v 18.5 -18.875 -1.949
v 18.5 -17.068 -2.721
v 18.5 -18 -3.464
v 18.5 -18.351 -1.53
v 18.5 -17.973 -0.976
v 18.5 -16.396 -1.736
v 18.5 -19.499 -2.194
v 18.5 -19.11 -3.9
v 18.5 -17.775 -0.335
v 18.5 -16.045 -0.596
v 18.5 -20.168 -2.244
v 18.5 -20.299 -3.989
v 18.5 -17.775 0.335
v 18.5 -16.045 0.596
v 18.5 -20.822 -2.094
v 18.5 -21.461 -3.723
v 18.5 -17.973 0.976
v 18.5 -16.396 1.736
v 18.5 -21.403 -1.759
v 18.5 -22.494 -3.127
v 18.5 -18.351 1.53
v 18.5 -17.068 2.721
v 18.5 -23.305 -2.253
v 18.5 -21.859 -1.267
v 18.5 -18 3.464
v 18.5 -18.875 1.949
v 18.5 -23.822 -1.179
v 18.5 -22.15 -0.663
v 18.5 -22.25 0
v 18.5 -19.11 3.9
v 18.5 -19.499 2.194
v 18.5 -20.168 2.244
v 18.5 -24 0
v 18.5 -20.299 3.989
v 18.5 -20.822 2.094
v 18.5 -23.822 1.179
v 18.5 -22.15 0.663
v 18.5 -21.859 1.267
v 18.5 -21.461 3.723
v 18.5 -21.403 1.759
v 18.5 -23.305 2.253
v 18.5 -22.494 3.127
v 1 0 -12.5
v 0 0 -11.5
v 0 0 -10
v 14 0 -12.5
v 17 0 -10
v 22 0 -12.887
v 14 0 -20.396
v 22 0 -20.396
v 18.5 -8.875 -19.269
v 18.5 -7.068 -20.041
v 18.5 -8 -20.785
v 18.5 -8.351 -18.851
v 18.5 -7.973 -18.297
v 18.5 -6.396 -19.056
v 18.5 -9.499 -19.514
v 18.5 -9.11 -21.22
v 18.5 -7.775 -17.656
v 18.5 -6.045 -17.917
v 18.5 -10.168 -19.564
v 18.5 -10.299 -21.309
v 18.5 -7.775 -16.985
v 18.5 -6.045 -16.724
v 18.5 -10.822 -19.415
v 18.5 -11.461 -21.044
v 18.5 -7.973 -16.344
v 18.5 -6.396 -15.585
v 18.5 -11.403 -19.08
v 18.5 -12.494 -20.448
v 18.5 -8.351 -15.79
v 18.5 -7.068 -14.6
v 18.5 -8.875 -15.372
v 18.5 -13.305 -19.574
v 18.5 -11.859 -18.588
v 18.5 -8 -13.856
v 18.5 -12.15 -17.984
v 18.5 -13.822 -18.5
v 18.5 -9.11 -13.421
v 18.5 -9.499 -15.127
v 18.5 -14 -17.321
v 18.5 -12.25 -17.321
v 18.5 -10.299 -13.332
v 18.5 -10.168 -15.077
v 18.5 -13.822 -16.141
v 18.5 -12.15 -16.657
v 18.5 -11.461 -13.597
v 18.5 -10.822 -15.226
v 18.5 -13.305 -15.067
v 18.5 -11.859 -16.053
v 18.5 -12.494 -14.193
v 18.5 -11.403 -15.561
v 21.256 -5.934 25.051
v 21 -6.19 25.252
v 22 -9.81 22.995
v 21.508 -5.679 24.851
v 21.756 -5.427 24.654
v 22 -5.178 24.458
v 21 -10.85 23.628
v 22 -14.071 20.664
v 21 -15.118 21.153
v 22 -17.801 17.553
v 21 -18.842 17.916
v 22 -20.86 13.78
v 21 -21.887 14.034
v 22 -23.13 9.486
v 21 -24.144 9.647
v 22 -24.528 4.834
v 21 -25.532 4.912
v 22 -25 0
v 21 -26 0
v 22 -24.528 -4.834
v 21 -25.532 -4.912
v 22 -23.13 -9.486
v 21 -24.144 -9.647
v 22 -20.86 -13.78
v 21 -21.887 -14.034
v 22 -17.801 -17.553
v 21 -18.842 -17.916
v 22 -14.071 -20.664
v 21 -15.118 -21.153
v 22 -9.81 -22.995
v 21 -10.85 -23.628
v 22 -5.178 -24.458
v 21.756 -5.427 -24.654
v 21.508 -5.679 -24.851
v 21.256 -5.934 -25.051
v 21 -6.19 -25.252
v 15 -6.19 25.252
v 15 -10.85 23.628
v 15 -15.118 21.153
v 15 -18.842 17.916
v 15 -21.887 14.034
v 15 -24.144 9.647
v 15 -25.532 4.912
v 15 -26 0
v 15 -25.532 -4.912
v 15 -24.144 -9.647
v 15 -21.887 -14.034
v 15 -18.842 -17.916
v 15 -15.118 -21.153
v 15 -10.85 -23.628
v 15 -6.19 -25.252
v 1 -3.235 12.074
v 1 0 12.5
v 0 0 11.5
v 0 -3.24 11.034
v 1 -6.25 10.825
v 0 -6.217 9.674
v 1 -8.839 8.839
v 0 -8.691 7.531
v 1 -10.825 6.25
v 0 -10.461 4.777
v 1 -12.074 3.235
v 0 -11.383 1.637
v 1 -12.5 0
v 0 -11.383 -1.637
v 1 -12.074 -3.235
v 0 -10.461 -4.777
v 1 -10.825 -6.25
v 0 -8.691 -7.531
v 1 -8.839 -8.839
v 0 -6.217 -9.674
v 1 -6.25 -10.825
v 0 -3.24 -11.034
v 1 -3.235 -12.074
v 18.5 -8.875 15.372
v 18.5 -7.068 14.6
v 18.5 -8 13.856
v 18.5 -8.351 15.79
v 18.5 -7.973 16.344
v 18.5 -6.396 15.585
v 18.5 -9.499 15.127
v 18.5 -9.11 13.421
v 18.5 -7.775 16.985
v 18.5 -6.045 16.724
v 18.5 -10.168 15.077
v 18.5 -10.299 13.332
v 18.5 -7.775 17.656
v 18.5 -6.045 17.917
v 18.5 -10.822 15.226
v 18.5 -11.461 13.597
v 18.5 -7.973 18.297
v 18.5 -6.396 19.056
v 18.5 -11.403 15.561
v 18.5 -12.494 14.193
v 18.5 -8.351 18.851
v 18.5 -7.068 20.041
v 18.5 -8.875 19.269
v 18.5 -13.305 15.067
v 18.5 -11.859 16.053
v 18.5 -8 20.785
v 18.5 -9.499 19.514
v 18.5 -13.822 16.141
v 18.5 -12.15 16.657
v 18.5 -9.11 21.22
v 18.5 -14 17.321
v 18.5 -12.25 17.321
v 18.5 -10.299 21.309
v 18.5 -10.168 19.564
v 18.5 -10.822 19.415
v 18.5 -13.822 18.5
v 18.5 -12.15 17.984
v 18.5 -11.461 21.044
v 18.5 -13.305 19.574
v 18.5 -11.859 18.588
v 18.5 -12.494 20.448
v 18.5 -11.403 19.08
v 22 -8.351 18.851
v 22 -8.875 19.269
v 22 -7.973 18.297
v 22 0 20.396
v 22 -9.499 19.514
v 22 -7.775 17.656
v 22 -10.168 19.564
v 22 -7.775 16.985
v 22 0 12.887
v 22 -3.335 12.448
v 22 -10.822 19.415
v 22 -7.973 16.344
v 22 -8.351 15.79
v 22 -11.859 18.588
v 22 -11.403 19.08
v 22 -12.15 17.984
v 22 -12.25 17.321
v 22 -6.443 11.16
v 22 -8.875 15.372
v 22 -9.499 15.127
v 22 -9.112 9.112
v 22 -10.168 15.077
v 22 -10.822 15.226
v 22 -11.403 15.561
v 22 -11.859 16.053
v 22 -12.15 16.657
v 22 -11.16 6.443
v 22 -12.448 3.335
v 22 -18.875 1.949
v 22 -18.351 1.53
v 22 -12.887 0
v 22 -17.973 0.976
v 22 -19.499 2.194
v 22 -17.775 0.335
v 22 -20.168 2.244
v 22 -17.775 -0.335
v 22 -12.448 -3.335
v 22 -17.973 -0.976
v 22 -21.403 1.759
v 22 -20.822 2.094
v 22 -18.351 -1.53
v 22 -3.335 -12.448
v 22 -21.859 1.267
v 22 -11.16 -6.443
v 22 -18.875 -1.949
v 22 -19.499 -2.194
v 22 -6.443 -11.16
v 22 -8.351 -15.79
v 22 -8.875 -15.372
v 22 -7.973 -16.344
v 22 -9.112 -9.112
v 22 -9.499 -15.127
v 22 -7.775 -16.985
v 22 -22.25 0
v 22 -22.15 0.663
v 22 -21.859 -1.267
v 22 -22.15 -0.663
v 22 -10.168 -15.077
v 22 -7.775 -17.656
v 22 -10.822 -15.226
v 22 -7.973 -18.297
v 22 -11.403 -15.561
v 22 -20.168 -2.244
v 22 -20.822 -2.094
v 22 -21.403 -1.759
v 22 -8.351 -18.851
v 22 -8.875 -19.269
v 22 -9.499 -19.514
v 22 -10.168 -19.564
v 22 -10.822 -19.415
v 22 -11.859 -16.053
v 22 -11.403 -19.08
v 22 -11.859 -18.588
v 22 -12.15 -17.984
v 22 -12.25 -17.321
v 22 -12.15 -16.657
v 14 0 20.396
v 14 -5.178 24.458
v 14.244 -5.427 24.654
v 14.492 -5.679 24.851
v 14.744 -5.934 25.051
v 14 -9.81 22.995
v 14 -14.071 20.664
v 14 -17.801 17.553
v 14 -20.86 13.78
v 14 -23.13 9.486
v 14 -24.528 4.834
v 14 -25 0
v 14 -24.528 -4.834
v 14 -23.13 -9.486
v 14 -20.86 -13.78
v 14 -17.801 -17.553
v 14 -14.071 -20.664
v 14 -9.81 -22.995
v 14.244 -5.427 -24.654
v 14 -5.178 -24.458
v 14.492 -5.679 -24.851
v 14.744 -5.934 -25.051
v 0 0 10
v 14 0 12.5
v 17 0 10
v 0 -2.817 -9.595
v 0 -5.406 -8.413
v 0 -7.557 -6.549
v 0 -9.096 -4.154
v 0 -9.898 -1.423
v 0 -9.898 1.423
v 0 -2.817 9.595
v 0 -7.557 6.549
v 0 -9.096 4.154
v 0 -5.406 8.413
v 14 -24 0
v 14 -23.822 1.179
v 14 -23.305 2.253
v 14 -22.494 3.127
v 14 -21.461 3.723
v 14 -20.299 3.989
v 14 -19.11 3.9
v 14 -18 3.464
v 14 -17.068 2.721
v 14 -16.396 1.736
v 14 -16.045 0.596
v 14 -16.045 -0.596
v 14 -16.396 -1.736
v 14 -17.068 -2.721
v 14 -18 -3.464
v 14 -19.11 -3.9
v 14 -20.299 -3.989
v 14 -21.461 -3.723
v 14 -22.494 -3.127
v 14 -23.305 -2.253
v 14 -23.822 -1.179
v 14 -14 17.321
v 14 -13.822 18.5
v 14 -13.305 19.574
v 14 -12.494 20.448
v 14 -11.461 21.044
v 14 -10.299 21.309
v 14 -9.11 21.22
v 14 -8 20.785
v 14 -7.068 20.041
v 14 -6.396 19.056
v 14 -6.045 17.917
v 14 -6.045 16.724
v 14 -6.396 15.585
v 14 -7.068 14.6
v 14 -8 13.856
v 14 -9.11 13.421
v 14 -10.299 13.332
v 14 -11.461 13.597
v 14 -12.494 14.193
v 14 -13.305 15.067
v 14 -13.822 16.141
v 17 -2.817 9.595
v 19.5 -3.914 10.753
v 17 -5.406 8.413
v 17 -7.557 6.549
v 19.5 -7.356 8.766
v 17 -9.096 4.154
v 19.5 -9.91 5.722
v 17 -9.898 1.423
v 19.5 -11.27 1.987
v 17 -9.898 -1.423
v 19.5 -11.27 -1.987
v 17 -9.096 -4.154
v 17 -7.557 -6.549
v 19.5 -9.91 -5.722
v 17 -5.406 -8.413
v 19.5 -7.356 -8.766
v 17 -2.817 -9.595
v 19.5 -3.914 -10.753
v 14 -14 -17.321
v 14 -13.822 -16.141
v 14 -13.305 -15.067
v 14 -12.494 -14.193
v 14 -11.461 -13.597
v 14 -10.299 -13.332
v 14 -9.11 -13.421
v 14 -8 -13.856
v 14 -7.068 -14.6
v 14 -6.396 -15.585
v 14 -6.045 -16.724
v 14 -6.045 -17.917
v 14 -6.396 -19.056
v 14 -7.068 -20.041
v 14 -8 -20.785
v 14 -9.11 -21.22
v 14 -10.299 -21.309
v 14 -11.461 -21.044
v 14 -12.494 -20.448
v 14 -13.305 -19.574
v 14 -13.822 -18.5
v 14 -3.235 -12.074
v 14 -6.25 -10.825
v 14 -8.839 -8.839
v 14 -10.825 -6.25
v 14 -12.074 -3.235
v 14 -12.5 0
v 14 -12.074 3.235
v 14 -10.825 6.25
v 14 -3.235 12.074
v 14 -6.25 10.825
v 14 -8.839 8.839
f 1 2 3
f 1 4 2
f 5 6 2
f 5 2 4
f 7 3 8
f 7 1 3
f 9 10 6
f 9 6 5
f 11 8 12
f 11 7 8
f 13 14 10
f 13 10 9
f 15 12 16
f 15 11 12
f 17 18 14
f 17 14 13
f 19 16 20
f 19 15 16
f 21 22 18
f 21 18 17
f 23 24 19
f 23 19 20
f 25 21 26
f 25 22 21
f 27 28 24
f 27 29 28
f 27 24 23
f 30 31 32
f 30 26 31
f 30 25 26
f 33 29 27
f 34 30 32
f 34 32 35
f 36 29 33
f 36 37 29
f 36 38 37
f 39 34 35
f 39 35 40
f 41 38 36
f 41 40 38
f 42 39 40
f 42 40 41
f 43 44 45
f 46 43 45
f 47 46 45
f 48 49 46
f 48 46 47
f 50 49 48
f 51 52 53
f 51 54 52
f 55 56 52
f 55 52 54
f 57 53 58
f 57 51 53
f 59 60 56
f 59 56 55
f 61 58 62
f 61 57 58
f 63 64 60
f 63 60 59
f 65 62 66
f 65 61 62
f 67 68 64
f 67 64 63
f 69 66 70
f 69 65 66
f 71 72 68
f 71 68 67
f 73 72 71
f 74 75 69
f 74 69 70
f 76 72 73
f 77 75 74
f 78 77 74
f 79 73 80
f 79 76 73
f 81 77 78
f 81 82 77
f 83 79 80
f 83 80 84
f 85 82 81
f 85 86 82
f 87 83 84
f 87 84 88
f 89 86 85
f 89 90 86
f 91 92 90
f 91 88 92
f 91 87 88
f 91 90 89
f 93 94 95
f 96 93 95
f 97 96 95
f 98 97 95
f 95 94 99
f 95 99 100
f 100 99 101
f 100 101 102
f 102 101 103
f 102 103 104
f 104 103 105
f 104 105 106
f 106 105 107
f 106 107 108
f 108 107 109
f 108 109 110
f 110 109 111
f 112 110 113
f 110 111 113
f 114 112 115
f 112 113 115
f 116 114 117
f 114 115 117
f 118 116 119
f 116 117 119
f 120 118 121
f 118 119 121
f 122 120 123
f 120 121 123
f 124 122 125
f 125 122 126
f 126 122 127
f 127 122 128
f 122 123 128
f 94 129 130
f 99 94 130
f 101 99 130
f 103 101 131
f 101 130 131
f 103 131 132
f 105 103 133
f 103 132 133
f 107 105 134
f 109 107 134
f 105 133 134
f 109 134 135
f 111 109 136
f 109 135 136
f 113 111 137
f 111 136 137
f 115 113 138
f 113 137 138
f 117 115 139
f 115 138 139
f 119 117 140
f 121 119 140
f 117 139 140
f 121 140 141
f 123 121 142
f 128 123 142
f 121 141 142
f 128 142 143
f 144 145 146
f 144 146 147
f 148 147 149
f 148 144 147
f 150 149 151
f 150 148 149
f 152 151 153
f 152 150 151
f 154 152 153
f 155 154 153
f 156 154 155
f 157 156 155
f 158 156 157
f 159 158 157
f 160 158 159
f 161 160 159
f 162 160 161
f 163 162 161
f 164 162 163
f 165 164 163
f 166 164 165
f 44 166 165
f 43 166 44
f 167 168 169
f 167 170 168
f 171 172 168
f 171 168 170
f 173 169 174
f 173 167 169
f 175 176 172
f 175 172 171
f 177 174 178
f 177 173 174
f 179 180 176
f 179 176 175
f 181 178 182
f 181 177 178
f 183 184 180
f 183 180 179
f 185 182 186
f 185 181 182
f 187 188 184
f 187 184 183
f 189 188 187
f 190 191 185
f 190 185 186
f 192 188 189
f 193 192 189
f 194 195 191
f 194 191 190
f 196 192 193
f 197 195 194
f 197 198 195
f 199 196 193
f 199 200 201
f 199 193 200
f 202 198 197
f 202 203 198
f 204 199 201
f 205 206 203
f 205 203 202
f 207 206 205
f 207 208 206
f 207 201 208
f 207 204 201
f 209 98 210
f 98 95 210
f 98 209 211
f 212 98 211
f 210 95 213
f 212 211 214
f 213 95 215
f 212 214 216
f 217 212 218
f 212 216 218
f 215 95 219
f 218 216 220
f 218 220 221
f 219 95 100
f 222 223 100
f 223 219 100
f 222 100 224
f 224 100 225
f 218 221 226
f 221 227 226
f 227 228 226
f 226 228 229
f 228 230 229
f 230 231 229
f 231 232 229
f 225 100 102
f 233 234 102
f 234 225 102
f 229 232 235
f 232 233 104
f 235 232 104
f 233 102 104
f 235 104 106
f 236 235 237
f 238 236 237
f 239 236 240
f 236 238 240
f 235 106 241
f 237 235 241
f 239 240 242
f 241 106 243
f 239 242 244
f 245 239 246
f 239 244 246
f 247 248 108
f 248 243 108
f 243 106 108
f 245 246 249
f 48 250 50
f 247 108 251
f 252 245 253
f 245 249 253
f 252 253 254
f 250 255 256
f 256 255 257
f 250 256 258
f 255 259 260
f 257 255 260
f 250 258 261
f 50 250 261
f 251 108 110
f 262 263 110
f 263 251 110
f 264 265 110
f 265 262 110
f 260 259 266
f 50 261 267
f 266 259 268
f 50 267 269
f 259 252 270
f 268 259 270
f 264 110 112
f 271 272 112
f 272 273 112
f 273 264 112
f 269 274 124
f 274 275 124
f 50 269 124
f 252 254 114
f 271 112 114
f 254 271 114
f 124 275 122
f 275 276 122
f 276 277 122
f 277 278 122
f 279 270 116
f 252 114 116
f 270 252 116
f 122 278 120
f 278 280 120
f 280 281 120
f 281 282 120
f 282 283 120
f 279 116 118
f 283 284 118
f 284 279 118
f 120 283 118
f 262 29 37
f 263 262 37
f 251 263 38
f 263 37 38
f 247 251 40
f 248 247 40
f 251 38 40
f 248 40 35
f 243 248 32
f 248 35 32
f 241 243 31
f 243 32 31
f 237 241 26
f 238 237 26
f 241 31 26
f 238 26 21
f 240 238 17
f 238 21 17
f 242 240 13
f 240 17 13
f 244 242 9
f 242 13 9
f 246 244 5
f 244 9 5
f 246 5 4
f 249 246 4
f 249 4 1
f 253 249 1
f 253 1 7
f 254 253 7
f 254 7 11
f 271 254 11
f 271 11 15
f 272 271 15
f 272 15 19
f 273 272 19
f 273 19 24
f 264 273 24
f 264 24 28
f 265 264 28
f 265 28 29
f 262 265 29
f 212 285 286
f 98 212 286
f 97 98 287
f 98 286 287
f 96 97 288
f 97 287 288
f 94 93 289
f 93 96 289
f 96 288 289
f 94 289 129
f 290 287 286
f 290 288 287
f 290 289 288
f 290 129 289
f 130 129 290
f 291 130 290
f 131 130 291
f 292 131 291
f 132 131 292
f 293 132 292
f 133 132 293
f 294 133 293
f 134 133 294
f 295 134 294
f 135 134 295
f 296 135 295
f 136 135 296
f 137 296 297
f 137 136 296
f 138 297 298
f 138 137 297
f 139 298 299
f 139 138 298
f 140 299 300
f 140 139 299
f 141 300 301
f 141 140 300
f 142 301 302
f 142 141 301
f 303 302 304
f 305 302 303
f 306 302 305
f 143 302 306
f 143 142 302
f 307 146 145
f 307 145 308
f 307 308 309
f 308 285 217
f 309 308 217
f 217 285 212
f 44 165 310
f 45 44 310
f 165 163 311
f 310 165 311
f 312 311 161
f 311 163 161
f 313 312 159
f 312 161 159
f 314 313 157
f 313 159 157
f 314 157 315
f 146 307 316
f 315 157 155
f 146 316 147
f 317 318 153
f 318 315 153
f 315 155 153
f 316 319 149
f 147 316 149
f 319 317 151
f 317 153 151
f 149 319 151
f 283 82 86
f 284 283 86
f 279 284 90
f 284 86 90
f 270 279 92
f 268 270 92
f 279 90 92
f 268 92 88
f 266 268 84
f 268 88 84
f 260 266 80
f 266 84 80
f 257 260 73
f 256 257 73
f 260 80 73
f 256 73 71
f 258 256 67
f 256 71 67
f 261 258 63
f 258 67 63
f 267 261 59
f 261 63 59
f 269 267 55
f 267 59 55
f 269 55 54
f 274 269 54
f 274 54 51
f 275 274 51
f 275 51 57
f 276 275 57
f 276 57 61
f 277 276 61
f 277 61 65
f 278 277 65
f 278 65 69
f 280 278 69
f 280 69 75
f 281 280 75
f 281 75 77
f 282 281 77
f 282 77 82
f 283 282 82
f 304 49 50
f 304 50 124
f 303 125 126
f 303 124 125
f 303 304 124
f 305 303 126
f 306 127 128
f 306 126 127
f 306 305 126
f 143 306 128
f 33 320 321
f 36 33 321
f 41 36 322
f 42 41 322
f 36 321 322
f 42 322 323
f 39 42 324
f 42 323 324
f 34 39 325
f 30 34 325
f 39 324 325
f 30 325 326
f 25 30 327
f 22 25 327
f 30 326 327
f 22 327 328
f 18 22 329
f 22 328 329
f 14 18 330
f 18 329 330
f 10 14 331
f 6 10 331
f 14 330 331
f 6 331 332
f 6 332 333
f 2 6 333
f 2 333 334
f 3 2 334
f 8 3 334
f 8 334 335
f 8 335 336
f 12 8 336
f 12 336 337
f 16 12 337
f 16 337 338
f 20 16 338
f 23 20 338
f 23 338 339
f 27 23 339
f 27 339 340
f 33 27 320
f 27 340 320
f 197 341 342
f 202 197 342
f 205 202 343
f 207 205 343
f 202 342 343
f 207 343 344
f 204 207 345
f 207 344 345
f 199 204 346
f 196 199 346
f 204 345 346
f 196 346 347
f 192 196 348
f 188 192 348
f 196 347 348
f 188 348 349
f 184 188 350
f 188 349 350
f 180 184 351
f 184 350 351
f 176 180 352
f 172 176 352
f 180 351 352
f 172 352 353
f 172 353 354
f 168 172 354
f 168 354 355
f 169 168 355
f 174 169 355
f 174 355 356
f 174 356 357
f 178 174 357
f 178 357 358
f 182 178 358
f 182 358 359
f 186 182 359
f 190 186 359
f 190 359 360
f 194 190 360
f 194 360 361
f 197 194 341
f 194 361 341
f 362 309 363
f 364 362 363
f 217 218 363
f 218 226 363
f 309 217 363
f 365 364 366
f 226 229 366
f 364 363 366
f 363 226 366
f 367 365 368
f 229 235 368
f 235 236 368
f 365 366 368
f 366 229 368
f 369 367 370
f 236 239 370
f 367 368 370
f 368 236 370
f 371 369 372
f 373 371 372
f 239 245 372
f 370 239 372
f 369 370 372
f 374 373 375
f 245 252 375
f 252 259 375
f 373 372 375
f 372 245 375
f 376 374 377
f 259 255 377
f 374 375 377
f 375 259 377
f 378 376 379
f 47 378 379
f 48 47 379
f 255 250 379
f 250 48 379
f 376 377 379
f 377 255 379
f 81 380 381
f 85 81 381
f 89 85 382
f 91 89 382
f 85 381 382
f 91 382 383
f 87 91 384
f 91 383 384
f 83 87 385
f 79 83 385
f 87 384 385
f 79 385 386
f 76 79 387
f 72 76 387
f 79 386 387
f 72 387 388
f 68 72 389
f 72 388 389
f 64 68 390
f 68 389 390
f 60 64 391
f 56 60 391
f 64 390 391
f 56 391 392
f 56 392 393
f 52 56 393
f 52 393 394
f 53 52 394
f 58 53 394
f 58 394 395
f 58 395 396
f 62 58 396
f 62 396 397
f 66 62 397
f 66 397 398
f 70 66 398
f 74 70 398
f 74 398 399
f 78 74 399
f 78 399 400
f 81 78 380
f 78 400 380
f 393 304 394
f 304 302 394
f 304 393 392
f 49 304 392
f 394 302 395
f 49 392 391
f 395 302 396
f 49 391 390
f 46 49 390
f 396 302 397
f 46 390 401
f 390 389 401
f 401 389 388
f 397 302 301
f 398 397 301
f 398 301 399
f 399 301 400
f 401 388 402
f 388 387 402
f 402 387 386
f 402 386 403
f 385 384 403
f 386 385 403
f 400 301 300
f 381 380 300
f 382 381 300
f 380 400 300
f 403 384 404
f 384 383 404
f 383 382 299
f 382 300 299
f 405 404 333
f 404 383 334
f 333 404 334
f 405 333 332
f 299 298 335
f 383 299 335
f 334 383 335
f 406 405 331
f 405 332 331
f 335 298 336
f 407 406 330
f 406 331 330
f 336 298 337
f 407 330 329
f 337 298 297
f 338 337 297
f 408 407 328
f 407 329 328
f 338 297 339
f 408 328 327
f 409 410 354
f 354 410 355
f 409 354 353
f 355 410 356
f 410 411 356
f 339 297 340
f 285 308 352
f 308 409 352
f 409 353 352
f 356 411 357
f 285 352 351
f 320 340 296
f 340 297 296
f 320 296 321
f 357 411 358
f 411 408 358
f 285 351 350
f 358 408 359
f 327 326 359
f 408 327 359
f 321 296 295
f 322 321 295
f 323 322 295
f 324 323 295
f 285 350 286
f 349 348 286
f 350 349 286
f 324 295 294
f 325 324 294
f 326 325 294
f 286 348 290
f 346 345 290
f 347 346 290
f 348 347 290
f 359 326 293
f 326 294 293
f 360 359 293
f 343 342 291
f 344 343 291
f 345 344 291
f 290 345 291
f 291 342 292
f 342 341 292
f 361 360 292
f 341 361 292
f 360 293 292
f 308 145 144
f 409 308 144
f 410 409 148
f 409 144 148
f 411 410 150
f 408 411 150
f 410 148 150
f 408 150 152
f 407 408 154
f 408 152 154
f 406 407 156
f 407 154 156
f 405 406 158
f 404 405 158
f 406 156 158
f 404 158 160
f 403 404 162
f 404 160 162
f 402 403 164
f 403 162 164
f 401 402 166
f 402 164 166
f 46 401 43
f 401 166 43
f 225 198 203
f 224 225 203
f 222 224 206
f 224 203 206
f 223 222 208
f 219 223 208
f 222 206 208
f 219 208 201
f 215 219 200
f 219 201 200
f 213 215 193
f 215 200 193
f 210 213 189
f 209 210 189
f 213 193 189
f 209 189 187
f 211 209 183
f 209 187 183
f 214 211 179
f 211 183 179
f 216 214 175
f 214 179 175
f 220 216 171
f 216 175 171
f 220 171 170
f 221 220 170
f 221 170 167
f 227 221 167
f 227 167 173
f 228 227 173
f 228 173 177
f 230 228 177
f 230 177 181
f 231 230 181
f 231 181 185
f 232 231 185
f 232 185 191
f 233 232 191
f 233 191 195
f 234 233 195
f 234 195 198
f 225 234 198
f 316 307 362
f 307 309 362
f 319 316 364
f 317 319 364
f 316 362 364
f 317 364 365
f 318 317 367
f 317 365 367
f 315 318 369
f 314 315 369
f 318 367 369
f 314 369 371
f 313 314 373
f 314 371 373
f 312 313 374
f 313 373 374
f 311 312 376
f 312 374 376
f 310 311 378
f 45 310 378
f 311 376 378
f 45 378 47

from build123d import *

# Parameters (mm, degrees)
F1_ANGLE    = 180
F2_R        = 4
F2_R_2      = 2.25
F3_DEPTH    = 4.5
F4_DEPTH    = 8
F5_SIZE     = 1
F6_T1_DEPTH = 37.8922901759


# Not quite as in the source:
# - a fillet or chamfer that OpenCascade refuses, or shapes differently, is made with other operations: its cross-section is extruded or revolved along the edge and cut away or added


with BuildPart() as f1:
    # F0 (on Front) → F1 (revolve)
    with BuildSketch(Plane.XZ):
        Polygon((0, 12.5), (0, 10), (17, 10), (22, 12.8867513459), (22, 26), (14, 26), (14, 12.5), align=None)
    revolve(axis=Axis((14.5569612949, 0, 0), (1, 0, 0)), revolution_arc=F1_ANGLE)

    # F2 (on face) → F3 (cut)
    with BuildSketch(Plane(origin=(14, 0, 0), x_dir=(0, -1, 0), z_dir=(-1, 0, 0))):
        with Locations((20, 0)):
            Circle(F2_R)
        with Locations((20, 0)):
            Circle(F2_R_2, mode=Mode.SUBTRACT)
        with Locations((10, -17.3205080757)):
            Circle(F2_R)
        with Locations((10, -17.3205080757)):
            Circle(F2_R_2, mode=Mode.SUBTRACT)
        with Locations((10, 17.3205080757)):
            Circle(F2_R)
        with Locations((10, 17.3205080757)):
            Circle(F2_R_2, mode=Mode.SUBTRACT)
    extrude(amount=-F3_DEPTH, mode=Mode.SUBTRACT)

    # F4 (cut): faces of the model
    f4_faces = [f1.faces().sort_by_distance(p)[0] for p in [
        (14, -10, 17.3205080757),
        (14, -20, 0),
        (14, -10, -17.3205080757),
    ]]
    extrude(f4_faces, amount=-F4_DEPTH, mode=Mode.SUBTRACT)

    # F5
    f5_edges = [f1.edges().sort_by_distance(p)[0] for p in [
        (0, -12.5, 0),
        (14, -26, 0),
        (22, -26, 0),
    ]]
    chamfer(f5_edges, length=F5_SIZE)

    # F6: chamfer of 5 on 2 edges, made by hand

    # F6_s2 → F6_t1 (cut)
    with BuildSketch(Plane.YZ.offset(-0.946145088)):
        with BuildLine():
            Line((0, -20.3960780544), (-6.1904761905, -25.2522871149))
            ThreePointArc((-6.1904761905, -25.2522871149), (-3.188239959, -25.8037812338), (0, -26))
            Line((0, -26), (0, -20.3960780544))
        make_face()
        with BuildLine():
            Line((0, 20.3960780544), (-6.1904761905, 25.2522871149))
            ThreePointArc((-6.1904761905, 25.2522871149), (-3.188239959, 25.8037812338), (0, 26))
            Line((0, 26), (0, 20.3960780544))
        make_face()
    extrude(amount=F6_T1_DEPTH, mode=Mode.SUBTRACT)


solid = f1.part
